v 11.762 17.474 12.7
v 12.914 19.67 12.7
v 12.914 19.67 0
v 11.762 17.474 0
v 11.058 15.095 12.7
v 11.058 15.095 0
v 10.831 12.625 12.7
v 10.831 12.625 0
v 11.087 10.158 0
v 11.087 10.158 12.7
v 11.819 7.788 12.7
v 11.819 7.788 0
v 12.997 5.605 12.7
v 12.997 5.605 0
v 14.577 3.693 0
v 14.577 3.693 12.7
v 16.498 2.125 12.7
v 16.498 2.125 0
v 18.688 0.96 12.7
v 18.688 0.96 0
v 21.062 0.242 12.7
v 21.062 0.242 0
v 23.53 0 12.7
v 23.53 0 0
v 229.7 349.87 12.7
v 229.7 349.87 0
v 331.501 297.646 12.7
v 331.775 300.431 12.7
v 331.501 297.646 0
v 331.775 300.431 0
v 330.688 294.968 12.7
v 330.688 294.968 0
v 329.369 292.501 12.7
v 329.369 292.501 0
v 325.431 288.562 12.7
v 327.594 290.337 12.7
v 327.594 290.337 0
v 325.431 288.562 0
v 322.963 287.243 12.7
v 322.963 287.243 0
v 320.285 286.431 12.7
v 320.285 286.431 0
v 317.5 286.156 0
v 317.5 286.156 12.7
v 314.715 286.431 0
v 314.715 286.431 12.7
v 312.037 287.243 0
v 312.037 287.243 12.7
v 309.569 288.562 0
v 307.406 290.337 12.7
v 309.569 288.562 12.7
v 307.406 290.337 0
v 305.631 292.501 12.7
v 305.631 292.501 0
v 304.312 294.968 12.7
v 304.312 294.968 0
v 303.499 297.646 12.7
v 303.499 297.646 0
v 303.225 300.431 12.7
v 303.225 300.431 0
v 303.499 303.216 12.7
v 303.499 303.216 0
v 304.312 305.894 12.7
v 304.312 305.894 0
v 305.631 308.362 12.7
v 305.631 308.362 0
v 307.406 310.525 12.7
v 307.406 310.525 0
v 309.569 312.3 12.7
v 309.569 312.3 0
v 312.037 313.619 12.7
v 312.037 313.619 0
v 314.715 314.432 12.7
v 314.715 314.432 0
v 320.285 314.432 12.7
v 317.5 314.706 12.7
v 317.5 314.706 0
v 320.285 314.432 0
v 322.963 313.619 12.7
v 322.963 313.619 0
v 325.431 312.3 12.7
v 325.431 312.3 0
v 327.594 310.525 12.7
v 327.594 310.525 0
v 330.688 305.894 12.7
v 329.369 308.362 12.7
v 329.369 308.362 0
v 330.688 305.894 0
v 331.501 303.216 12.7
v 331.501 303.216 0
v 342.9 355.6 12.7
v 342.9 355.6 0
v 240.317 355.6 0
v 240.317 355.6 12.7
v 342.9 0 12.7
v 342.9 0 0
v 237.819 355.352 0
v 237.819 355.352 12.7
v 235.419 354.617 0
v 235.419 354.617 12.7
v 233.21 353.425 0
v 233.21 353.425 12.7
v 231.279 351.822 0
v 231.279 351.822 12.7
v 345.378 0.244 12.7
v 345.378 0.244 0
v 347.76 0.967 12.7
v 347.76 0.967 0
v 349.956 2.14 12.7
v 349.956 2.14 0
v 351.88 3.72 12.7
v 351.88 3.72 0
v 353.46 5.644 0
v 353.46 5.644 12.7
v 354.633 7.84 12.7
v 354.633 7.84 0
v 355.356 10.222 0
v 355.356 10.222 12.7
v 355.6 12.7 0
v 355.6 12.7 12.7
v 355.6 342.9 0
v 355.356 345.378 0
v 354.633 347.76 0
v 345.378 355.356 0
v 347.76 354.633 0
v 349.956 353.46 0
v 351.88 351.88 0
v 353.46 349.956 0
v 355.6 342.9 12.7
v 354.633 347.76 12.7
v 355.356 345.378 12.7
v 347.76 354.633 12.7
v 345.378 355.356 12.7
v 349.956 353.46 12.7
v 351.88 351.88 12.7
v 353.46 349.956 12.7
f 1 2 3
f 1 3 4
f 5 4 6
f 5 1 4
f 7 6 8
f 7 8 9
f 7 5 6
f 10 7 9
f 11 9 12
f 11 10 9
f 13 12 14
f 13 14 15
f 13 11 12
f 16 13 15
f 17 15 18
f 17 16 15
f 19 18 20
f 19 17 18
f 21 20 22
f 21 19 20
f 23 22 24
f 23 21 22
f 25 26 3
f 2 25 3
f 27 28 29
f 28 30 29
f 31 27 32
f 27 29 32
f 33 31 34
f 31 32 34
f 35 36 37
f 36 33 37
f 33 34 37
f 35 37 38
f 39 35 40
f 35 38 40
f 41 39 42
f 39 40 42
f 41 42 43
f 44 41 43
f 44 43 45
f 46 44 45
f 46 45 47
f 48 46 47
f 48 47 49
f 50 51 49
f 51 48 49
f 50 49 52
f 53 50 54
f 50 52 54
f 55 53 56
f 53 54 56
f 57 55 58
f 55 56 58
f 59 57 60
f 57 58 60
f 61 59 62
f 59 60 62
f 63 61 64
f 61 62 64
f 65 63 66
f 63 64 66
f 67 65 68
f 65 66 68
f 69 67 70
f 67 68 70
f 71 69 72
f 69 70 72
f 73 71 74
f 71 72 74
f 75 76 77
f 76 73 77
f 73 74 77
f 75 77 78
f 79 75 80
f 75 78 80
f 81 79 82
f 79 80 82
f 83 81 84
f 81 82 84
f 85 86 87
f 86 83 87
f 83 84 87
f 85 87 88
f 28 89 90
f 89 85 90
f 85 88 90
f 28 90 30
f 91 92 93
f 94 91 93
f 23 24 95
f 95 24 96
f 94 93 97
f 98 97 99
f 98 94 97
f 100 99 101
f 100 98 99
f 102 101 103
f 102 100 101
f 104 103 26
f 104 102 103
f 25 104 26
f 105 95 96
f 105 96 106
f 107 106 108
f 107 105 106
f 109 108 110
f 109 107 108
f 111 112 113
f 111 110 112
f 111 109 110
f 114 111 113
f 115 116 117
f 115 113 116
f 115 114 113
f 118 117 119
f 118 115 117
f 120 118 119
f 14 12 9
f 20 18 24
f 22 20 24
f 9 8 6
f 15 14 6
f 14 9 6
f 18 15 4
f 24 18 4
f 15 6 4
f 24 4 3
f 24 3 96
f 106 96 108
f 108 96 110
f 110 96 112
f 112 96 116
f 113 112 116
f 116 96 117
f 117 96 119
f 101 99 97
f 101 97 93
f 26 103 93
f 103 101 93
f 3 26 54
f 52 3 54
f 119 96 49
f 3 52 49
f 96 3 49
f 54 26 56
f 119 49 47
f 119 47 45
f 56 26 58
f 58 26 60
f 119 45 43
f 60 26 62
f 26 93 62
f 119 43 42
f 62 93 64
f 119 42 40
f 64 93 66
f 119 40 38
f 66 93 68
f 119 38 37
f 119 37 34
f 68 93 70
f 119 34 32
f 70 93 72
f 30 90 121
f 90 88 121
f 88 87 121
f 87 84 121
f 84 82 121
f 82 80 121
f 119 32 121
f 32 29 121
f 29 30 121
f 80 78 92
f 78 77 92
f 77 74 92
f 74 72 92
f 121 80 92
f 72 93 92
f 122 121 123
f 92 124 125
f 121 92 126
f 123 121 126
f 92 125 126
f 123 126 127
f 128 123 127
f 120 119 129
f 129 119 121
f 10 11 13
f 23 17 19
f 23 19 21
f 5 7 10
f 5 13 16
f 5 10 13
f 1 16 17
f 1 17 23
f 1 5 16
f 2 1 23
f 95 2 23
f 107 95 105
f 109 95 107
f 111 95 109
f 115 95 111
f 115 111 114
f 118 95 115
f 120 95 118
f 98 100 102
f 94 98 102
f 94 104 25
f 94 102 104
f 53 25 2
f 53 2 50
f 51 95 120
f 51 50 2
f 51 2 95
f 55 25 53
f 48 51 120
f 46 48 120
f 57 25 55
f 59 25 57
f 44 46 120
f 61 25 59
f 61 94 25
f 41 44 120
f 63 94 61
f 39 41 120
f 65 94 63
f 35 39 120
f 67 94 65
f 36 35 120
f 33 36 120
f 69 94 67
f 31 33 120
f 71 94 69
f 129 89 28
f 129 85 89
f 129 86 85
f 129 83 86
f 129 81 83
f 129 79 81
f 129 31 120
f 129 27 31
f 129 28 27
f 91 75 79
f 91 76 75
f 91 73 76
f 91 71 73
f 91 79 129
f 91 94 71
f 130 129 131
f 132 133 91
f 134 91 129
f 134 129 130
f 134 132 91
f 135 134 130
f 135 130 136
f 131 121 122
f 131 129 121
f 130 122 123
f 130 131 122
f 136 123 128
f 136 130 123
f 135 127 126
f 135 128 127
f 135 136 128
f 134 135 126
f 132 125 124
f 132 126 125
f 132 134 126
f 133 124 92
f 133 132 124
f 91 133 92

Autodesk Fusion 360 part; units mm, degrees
sketch "Sketch1" plane through (0, 0, 0) normal (0, 0, 1) x (1, 0, 0)
  line L0 (0, 0) -> (355.6, 0)
  line L1 (355.6, 0) -> (355.6, 355.6)
  line L2 (355.6, 355.6) -> (233.4623, 355.6)
  circle A0 centre (317.5, 300.4312) radius 14.2748
  line L3 (233.4623, 355.6) -> (0, 0)
  dimension "d1" = 355.6
  dimension "d3" = 28.5496
  dimension "d4" = 300.4312
  dimension "d5" = 38.1
extrude "Extrude1" add sketch "Sketch1" along normal blind 12.7
fillet "Fillet1" radius 12.7 4 edges at (355.6, 355.6, 6.35) (233.4623, 355.6, 6.35) (355.6, 0, 6.35) (0, 0, 6.35)
